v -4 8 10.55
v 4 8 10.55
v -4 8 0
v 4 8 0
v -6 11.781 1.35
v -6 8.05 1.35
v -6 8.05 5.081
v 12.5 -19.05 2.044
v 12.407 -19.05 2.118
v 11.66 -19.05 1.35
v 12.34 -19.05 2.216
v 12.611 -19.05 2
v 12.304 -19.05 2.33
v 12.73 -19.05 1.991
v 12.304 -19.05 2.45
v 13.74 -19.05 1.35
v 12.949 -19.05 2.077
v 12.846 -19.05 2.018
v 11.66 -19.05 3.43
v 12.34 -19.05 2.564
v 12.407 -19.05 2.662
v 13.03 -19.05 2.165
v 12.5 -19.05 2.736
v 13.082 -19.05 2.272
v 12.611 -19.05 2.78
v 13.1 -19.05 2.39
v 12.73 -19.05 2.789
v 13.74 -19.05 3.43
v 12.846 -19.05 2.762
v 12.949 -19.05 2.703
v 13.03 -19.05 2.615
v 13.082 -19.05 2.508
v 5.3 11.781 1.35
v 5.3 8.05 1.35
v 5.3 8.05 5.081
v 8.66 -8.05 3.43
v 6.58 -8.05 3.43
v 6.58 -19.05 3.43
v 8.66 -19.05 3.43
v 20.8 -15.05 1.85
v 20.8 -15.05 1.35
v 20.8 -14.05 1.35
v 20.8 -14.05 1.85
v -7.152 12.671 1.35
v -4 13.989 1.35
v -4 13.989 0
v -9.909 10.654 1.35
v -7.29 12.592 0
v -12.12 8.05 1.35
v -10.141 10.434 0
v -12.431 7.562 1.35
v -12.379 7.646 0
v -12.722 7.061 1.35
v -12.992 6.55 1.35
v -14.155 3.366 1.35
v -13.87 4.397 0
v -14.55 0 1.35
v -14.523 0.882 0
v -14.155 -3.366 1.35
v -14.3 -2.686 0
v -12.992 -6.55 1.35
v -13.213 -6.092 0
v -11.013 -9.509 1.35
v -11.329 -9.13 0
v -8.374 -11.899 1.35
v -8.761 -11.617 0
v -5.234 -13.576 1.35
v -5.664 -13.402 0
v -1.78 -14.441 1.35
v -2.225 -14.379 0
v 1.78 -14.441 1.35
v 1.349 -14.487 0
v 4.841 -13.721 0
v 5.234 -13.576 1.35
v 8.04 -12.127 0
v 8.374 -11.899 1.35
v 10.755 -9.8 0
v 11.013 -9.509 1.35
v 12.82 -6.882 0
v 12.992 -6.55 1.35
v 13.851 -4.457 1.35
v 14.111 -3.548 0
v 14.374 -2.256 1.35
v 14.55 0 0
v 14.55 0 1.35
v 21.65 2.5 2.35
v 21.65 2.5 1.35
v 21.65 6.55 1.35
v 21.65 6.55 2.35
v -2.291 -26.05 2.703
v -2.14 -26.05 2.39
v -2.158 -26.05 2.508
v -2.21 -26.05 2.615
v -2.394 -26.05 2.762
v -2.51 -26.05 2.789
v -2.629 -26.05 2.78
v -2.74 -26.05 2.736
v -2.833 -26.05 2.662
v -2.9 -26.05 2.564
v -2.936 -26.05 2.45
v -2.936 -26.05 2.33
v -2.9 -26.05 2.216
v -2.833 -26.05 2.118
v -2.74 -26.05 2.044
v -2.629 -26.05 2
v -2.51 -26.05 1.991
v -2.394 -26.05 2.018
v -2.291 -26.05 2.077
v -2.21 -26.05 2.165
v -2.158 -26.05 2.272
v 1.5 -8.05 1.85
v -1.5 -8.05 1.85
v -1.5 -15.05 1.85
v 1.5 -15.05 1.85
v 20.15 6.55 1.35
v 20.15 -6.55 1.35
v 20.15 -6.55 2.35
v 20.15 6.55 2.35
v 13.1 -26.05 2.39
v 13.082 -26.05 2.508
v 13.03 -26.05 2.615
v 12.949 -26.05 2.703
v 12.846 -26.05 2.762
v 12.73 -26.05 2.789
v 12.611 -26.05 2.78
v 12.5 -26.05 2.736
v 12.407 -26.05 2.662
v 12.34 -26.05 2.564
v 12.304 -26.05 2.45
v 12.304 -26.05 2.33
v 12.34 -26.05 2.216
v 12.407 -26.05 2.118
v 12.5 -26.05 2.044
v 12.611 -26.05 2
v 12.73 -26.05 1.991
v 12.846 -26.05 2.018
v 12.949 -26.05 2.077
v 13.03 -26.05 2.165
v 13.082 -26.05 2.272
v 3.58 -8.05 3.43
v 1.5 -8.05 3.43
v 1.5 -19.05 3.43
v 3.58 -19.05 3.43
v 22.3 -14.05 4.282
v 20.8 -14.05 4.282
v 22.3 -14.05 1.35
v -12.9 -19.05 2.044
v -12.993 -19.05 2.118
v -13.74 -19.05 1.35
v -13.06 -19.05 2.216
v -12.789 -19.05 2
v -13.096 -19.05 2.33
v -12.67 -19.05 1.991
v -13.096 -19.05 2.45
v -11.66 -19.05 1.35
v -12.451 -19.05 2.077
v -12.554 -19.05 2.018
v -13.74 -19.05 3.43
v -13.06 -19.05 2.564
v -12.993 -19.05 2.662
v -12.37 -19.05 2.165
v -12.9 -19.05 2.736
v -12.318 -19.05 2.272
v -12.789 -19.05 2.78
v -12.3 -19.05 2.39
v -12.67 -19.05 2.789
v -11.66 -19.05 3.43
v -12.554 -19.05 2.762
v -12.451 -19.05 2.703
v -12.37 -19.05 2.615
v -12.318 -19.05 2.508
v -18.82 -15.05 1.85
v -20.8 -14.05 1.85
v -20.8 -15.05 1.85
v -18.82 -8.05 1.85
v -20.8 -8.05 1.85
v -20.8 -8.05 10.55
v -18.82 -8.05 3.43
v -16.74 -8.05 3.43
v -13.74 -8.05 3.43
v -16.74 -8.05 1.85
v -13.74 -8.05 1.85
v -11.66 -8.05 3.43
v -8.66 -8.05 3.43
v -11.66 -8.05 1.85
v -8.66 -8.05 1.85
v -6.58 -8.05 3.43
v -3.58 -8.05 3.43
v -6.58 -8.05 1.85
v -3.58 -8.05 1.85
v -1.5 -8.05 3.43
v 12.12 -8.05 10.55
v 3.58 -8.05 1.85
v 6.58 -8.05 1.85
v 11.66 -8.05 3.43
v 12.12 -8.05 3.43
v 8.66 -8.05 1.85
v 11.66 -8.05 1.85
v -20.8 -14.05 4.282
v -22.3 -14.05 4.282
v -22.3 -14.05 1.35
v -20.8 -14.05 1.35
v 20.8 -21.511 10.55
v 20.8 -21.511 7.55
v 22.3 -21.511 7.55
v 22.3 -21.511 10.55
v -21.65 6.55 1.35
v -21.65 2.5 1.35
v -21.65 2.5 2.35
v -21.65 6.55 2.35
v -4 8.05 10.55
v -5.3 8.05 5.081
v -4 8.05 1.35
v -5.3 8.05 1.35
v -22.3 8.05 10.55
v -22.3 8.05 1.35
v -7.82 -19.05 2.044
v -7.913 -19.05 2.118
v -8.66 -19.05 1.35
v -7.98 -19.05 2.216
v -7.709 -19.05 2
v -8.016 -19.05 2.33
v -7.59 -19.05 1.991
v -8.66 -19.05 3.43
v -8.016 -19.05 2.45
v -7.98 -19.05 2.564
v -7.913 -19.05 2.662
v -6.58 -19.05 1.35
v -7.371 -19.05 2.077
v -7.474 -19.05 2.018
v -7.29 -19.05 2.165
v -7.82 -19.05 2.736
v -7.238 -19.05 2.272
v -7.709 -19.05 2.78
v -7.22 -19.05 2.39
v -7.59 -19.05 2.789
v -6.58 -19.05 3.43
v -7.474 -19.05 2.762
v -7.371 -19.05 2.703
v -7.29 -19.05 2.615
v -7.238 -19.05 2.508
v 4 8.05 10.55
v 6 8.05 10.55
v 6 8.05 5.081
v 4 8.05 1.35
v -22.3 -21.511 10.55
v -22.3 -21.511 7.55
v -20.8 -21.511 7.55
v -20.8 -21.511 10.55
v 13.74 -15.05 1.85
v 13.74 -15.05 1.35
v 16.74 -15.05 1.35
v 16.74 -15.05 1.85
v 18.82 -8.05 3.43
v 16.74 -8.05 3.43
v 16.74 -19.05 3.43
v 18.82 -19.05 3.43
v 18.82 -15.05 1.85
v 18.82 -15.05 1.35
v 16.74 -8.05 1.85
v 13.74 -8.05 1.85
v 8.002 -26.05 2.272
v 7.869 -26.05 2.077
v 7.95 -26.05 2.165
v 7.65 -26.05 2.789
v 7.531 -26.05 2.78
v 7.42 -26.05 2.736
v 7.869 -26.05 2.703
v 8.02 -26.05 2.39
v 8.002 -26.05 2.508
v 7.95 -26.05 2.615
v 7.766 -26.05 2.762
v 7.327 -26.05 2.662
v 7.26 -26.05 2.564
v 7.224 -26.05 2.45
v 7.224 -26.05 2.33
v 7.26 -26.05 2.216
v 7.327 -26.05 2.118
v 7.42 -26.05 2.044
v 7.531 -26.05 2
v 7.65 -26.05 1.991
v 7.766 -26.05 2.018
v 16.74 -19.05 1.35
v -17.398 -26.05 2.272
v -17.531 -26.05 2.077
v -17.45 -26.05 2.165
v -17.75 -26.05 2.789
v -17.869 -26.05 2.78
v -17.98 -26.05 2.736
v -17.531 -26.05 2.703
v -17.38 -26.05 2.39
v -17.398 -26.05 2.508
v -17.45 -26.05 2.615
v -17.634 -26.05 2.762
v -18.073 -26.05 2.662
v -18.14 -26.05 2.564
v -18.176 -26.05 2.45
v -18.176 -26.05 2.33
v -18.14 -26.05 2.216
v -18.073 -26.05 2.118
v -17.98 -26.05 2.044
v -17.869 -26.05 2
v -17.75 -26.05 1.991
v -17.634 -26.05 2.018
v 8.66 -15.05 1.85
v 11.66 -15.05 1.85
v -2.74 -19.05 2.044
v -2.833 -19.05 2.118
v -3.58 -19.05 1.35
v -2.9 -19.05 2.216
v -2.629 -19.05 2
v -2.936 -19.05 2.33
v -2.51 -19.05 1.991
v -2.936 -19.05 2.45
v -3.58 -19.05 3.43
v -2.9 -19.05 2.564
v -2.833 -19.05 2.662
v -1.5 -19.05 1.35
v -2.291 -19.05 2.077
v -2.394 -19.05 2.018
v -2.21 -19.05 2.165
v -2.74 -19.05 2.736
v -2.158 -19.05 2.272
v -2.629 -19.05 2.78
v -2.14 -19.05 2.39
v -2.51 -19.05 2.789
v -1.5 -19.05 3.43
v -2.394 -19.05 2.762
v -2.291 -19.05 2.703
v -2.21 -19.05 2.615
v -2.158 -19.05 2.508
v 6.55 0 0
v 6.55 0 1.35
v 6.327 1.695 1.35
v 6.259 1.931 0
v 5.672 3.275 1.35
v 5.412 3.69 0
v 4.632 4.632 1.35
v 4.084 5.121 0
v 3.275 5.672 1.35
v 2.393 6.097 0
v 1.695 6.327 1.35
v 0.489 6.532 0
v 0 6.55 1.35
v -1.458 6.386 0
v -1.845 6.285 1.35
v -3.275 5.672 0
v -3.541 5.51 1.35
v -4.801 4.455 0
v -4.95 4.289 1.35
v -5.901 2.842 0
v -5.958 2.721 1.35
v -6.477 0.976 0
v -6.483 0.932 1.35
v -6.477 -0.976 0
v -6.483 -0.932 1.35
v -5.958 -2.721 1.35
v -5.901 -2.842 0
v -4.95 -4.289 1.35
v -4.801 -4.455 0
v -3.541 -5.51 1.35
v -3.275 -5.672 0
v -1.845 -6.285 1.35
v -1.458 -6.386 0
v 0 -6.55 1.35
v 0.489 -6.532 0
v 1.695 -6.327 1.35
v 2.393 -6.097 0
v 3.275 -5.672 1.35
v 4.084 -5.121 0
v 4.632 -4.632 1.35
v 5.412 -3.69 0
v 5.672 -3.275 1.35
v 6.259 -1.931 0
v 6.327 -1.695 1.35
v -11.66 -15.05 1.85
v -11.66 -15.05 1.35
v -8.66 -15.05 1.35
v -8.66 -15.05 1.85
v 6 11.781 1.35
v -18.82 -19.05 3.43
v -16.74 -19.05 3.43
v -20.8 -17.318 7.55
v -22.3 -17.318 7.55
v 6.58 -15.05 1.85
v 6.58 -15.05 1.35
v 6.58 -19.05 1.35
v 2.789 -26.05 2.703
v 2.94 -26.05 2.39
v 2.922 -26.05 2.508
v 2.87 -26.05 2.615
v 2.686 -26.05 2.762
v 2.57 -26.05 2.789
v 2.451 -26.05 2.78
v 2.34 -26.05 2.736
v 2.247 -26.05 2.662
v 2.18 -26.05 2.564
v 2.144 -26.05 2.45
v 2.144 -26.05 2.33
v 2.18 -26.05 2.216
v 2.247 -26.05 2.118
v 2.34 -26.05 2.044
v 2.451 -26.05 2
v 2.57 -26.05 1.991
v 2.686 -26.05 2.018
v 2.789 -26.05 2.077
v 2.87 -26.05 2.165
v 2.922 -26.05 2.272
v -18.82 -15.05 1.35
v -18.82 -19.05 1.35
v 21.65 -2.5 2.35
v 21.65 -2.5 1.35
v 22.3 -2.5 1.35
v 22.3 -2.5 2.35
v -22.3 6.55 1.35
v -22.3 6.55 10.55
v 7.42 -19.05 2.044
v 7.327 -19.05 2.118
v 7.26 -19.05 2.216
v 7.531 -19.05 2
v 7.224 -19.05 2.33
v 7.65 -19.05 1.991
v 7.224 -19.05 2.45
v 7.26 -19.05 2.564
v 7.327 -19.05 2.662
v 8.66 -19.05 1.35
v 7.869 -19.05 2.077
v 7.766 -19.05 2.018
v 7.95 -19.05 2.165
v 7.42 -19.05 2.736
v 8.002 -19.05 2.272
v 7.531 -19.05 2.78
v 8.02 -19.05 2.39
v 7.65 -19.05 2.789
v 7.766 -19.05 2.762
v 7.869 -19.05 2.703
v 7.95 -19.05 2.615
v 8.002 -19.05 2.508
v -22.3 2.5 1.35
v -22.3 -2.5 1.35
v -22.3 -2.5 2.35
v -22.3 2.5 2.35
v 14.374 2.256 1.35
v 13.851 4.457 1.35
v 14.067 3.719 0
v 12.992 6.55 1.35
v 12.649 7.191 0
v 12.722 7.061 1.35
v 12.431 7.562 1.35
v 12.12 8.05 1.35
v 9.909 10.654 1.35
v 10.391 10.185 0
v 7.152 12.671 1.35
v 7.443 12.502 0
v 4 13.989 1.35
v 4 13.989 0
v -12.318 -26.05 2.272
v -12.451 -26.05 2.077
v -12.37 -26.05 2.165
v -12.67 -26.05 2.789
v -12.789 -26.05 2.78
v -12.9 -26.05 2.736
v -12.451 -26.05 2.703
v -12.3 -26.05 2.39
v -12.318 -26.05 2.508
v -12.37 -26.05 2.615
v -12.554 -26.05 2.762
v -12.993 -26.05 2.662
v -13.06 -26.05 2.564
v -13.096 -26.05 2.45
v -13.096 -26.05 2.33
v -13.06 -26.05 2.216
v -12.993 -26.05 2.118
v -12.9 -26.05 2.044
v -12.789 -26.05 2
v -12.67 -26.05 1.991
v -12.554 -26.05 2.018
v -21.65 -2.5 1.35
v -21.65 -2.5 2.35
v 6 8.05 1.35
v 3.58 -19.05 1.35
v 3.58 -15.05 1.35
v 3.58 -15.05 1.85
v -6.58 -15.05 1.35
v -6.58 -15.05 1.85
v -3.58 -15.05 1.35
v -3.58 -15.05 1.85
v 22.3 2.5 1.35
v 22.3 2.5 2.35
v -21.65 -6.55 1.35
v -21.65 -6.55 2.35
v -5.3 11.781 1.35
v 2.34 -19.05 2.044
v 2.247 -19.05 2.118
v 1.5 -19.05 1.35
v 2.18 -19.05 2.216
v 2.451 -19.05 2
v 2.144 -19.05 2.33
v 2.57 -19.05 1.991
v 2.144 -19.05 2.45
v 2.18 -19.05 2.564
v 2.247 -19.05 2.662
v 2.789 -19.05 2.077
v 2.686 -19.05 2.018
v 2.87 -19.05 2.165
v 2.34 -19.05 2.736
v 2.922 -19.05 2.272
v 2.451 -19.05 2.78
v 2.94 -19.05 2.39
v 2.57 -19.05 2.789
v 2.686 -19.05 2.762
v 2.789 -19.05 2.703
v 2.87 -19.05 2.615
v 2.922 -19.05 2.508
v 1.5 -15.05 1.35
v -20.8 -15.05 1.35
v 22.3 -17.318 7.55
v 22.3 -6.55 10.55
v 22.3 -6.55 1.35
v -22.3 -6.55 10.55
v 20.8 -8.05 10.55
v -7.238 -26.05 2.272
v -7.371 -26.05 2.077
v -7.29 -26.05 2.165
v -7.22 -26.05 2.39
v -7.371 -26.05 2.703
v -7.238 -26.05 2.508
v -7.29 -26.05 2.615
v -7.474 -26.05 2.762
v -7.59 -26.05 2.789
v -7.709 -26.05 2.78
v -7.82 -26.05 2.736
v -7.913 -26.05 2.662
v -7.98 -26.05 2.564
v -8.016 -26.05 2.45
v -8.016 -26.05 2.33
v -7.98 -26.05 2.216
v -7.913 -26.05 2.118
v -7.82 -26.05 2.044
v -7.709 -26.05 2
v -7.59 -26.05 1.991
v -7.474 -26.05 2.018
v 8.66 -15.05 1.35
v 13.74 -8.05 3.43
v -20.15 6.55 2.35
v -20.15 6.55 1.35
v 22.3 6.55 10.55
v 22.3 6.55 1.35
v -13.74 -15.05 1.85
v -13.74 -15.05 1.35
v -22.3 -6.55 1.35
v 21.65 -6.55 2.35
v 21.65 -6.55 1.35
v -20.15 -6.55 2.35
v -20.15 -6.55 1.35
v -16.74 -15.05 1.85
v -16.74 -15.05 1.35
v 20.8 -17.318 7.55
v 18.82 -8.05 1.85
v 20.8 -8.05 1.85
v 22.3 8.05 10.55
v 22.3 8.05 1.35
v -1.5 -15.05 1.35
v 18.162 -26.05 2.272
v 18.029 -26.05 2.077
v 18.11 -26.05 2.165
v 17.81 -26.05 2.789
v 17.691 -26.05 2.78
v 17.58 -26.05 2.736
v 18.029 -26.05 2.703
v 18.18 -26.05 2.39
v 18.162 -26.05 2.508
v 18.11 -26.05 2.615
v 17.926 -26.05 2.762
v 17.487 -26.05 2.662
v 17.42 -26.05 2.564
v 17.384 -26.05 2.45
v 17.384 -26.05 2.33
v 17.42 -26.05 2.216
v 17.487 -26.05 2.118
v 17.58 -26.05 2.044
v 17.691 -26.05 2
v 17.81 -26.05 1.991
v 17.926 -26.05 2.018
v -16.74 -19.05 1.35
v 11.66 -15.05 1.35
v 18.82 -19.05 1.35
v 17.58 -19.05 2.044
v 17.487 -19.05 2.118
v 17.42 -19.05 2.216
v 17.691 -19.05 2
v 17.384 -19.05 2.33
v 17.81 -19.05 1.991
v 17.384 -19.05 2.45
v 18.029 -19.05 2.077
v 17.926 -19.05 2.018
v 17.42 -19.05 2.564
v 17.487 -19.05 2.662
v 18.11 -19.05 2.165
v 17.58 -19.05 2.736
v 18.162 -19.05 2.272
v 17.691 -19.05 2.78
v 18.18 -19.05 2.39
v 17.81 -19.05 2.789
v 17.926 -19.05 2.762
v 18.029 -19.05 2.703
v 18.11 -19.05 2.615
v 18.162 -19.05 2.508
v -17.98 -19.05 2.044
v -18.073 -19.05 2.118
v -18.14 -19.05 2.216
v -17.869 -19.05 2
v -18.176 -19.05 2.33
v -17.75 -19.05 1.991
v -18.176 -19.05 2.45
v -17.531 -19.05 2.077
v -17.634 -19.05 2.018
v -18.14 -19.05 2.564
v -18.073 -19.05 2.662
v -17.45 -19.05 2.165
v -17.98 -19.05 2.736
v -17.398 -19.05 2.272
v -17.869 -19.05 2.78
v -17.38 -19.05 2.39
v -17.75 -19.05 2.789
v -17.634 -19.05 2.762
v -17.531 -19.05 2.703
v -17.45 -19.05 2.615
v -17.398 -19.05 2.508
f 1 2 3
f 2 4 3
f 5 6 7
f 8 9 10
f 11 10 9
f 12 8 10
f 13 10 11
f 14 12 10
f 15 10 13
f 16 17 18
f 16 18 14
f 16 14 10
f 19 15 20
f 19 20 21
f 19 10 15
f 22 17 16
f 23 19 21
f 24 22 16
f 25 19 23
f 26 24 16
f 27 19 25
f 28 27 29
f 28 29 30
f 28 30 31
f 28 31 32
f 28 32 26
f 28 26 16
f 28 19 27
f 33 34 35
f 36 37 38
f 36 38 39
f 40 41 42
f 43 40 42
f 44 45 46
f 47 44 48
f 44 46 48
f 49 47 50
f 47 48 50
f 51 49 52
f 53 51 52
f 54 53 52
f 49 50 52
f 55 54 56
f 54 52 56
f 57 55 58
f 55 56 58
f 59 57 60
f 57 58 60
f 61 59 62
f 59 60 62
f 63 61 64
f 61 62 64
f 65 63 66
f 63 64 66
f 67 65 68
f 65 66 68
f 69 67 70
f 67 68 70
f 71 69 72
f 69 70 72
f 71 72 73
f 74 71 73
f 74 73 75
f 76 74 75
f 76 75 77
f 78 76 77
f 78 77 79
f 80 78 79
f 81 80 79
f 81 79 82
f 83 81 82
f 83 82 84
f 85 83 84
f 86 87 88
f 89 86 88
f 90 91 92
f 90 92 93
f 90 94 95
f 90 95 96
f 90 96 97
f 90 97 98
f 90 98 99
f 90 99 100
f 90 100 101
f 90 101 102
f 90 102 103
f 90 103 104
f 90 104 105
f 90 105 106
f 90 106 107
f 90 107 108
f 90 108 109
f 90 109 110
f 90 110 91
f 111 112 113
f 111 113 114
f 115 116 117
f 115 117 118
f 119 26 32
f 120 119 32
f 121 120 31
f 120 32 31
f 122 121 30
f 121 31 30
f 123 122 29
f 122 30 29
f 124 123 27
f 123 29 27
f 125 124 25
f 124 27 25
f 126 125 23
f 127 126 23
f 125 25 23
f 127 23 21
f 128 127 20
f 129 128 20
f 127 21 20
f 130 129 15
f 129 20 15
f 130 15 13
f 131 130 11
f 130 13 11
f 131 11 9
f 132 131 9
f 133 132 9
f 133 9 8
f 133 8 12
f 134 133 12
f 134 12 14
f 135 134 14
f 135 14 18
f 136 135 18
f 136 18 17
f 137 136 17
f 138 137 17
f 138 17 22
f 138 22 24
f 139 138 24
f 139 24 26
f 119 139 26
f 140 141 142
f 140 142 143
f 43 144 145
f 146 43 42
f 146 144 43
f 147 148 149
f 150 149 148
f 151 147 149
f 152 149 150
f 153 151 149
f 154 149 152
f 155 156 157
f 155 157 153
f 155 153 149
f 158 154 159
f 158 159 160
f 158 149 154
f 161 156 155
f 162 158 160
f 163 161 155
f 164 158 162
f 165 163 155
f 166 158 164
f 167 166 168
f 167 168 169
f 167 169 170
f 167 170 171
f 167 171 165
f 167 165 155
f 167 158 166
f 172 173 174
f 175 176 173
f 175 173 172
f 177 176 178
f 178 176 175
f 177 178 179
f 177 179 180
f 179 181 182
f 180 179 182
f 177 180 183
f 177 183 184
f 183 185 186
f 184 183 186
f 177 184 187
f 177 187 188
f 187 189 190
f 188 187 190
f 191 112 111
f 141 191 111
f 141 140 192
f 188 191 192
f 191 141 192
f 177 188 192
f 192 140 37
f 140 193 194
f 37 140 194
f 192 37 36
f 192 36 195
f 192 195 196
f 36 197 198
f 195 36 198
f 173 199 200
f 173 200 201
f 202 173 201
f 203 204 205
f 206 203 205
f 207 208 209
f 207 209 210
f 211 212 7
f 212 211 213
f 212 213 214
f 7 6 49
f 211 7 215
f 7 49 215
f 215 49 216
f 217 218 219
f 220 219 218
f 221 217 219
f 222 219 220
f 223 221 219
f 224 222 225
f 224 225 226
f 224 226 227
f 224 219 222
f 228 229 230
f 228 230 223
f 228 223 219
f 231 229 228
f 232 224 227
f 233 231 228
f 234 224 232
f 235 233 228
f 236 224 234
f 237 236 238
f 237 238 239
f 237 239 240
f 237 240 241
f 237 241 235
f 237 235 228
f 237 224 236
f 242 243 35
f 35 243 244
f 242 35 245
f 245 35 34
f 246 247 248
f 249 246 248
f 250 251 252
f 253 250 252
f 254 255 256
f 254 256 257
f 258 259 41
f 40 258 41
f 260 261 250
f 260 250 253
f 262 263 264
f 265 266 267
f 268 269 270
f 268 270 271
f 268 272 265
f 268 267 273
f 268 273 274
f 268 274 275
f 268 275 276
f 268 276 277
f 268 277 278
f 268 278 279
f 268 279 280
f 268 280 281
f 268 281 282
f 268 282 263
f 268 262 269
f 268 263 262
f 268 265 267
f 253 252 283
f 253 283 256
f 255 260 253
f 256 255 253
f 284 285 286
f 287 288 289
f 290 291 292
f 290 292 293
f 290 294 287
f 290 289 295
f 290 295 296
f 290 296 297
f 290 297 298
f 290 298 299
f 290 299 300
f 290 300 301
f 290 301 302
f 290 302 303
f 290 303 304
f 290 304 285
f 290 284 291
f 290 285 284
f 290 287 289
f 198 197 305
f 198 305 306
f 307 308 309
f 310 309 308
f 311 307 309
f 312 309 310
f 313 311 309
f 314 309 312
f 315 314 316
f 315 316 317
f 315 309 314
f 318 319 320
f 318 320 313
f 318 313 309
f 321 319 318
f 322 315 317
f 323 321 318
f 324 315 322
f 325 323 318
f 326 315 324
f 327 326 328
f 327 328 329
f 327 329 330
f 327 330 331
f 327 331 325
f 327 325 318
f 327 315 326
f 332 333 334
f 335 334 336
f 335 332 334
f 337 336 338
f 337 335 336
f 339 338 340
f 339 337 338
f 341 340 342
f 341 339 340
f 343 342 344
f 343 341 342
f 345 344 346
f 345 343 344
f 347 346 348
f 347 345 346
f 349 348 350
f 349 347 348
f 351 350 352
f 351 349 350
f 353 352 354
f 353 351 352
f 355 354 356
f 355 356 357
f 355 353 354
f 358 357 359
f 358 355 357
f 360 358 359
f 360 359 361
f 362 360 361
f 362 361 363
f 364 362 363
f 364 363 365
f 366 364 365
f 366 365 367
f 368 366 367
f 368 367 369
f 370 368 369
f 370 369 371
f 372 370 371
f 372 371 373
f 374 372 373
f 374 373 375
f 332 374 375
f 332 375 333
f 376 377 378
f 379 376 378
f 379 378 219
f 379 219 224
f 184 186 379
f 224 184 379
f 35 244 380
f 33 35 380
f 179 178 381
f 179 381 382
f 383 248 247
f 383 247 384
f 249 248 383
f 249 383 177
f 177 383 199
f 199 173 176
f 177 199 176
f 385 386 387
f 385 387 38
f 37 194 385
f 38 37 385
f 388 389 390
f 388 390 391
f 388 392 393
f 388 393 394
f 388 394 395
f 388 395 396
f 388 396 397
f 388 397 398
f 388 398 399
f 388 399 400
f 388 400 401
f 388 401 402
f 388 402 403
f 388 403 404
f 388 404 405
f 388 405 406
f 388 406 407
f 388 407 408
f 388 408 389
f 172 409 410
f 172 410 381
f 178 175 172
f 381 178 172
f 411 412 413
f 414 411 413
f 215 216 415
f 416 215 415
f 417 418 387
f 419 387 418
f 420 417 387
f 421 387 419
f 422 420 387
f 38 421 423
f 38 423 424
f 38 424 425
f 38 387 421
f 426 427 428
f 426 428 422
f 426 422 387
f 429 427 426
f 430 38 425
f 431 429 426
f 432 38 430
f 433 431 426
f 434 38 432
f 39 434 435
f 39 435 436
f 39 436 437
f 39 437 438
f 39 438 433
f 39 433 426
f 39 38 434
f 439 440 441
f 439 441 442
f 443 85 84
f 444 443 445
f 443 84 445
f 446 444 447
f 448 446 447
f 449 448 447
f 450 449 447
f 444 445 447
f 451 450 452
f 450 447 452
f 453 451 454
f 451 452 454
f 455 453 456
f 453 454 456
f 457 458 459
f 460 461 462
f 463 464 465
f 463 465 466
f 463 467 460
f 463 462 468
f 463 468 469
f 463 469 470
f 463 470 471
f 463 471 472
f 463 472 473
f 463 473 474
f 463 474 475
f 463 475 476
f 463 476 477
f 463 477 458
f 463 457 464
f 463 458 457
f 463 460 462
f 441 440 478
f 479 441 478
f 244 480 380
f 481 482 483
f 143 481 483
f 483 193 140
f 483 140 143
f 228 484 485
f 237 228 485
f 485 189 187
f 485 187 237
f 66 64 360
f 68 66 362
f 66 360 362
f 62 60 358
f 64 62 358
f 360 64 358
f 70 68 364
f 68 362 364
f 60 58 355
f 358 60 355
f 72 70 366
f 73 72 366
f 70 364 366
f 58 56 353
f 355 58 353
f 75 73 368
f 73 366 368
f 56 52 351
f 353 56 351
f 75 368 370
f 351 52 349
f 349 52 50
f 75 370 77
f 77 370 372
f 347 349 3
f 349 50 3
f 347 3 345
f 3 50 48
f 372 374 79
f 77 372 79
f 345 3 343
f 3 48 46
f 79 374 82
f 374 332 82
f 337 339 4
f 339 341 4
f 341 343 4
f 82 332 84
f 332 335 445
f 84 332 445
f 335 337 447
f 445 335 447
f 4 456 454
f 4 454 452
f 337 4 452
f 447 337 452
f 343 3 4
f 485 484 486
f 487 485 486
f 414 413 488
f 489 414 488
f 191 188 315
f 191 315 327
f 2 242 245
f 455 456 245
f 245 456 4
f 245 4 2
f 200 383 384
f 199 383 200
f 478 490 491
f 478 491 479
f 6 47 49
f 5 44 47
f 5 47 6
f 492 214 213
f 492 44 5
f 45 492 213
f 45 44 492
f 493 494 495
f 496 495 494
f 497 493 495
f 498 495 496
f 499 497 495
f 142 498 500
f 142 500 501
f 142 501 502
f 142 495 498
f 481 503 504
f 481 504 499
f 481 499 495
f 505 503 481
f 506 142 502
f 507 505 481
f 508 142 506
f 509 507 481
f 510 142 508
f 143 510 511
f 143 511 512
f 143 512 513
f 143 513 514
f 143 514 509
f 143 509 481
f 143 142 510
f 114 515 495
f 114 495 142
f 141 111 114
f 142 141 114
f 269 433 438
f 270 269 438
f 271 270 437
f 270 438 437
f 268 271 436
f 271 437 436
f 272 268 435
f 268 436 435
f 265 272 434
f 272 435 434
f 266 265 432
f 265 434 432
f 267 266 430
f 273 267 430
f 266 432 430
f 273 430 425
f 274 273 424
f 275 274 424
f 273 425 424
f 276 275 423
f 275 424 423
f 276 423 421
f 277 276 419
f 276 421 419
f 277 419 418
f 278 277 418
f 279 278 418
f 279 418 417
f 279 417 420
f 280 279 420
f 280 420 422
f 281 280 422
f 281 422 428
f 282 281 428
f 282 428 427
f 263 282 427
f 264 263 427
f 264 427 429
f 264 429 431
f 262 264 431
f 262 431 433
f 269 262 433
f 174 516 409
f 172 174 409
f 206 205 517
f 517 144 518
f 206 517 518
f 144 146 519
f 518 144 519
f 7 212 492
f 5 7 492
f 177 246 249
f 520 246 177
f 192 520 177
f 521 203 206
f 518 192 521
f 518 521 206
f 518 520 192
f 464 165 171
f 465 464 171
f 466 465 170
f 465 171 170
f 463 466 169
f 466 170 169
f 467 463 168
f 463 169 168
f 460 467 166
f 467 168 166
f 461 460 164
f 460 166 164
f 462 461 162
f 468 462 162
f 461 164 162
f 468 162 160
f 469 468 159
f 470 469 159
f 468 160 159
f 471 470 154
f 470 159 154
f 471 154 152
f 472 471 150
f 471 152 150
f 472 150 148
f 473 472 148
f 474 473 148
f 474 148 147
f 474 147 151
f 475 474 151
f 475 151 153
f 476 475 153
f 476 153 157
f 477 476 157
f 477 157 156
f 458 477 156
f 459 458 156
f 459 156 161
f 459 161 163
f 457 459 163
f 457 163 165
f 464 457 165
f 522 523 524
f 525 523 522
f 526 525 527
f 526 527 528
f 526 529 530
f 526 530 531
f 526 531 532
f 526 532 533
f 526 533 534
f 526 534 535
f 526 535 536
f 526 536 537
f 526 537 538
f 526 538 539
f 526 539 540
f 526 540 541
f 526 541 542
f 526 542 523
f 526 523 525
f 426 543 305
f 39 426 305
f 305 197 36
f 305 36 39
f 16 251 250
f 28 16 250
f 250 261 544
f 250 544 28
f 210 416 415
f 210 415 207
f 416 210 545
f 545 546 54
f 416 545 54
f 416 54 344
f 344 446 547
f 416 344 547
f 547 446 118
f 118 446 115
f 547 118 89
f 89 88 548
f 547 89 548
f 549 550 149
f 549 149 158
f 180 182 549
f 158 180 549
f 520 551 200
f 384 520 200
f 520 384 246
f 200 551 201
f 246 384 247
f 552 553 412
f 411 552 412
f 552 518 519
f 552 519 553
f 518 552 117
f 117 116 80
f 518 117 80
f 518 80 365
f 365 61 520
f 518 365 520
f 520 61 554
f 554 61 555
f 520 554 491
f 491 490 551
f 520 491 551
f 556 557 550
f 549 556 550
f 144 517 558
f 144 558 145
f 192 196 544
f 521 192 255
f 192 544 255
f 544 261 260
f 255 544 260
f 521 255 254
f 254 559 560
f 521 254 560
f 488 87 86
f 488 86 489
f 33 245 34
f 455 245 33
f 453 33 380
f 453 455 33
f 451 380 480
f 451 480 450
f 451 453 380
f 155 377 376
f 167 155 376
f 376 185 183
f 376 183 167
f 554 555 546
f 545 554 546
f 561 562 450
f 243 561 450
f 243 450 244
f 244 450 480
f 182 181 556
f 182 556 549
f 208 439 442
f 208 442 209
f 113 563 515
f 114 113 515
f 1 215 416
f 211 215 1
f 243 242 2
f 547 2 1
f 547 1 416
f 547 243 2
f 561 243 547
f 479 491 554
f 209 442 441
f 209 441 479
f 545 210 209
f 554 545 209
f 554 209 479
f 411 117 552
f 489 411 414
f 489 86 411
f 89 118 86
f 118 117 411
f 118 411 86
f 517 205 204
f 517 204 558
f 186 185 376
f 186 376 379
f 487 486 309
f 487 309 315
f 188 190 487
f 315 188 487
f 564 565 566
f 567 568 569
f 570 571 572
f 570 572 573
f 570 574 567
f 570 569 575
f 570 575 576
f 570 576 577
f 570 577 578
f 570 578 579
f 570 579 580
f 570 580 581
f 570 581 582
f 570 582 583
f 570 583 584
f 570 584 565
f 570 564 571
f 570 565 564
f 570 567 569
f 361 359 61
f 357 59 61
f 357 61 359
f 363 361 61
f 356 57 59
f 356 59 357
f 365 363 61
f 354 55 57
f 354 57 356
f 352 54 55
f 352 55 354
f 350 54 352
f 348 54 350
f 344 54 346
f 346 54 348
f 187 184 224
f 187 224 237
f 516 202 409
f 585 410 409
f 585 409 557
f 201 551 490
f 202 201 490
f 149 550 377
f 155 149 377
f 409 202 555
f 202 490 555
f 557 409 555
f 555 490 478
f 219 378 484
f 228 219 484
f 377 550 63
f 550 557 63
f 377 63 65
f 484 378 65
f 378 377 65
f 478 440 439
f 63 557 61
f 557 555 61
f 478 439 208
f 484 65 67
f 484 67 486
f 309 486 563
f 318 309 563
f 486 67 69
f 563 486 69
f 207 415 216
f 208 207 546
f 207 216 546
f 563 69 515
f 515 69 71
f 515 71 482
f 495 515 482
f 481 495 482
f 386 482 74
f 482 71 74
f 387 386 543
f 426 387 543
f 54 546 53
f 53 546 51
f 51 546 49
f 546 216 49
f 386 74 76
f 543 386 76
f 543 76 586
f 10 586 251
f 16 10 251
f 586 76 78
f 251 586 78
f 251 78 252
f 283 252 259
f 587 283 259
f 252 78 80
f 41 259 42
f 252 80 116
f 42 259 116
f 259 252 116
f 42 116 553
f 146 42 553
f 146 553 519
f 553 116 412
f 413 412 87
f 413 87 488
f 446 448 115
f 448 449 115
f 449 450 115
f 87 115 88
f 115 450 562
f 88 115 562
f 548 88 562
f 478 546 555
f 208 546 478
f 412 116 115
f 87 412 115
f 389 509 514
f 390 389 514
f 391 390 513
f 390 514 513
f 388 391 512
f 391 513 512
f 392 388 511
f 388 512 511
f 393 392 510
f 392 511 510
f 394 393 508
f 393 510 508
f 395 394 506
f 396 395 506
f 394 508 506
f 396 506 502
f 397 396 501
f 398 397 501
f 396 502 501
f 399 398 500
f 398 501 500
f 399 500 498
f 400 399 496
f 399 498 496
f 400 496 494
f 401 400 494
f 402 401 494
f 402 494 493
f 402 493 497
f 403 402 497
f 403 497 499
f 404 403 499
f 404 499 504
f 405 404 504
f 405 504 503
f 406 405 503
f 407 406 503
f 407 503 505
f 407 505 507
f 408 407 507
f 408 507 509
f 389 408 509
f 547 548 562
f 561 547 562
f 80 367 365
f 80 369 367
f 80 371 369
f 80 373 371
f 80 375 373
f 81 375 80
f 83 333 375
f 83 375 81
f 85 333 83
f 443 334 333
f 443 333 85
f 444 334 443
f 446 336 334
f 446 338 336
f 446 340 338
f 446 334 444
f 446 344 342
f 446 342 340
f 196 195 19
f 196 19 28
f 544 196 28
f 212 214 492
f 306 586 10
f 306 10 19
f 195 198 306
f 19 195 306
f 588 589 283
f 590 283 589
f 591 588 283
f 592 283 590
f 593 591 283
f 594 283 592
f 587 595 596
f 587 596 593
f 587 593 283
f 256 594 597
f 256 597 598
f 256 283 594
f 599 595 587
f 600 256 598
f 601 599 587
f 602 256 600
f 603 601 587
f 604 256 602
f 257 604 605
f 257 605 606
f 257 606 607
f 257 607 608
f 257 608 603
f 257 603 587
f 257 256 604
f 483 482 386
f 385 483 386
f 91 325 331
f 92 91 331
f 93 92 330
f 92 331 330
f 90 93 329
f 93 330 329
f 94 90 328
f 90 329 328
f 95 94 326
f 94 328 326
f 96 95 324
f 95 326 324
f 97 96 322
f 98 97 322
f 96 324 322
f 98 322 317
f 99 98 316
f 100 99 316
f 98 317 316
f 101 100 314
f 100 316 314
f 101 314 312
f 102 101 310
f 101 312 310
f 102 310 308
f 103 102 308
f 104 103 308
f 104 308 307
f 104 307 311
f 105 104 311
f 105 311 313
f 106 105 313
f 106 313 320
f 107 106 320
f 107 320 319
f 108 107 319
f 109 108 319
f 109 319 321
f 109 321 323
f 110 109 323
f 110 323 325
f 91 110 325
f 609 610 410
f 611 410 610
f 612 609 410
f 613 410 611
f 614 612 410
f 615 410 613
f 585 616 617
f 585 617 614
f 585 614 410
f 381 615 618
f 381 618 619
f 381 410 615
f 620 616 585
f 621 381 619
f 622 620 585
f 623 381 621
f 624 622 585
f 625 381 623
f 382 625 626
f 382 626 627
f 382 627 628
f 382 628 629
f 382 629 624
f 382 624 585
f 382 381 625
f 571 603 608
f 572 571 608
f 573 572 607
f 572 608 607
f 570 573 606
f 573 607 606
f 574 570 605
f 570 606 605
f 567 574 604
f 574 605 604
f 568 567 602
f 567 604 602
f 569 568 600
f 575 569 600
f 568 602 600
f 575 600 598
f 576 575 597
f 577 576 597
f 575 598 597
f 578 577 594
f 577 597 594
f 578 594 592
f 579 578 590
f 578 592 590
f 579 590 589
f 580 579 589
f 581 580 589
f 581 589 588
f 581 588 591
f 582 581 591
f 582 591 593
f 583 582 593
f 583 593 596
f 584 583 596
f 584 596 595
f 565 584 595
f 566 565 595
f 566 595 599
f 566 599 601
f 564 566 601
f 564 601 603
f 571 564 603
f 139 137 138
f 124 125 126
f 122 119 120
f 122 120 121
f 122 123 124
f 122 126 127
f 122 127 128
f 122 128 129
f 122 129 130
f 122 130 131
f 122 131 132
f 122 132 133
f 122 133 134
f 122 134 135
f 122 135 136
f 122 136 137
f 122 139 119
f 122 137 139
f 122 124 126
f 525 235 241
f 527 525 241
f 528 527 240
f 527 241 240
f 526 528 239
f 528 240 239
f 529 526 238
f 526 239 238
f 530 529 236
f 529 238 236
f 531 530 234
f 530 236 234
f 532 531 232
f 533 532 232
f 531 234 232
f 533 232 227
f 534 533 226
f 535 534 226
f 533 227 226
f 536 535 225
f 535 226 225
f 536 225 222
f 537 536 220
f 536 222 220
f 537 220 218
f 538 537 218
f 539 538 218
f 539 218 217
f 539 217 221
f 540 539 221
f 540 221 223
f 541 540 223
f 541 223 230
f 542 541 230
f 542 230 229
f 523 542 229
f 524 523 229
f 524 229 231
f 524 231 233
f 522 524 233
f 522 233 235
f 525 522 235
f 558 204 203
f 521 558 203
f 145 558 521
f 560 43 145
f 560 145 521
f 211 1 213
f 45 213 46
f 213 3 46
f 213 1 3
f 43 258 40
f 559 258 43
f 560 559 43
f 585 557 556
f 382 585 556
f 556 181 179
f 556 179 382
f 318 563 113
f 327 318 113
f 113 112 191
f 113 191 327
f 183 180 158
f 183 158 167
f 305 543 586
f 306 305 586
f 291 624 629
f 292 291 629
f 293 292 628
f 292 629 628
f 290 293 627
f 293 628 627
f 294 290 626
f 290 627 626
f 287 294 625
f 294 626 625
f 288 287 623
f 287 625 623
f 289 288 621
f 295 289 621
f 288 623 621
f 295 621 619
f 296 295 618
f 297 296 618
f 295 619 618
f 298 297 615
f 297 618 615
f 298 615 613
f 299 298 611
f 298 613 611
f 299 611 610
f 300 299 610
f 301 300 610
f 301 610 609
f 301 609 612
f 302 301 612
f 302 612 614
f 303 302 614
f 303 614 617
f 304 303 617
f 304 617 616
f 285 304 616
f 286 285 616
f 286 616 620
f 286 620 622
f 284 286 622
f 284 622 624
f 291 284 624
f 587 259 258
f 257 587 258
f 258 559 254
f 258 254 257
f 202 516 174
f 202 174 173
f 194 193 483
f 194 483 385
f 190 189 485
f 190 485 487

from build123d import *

# Parameters (mm, degrees)
SKETCH1_R           = 6.55
BOSS_EXTRUDE1_DEPTH = 1.35
SKETCH2_W           = 0.7
SKETCH2_H           = 3.730882663
SKETCH2_W_2         = 1.5
SKETCH2_H_2         = 13.460629035
BOSS_EXTRUDE2_DEPTH = 9.2
SKETCH3_W           = 1.5
SKETCH3_H           = 13.1
SKETCH3_W_2         = 0.65
SKETCH3_H_2         = 5
BOSS_EXTRUDE3_DEPTH = 1
CUT_EXTRUDE1_DEPTH  = 29.3
CUT_EXTRUDE2_DEPTH  = 45.6
SKETCH7_W           = 41.6
SKETCH7_H           = 7
BOSS_EXTRUDE4_DEPTH = 0.5
SKETCH8_R           = 0.4
PINS_DEPTH          = 11
PINS_2_DEPTH        = 11
PINS_3_DEPTH        = 11
PINS_4_DEPTH        = 11
PINS_5_DEPTH        = 11
PINS_6_DEPTH        = 11
PINS_7_DEPTH        = 11
PINS_8_DEPTH        = 11
SKETCH9_W           = 2.08
SKETCH9_H           = 2.08
BOSS_EXTRUDE6_DEPTH = 11


with BuildPart() as part:
    # Sketch1 → Boss-Extrude1 (new body)
    with BuildSketch(Plane.XY):
        with BuildLine():
            Line((0, 8), (-4, 8))
            Line((-4, 8), (-4, 13.989370965))
            ThreePointArc((-4, 13.989370965), (-8.760779075, -11.616851983), (14.55, 0))
            ThreePointArc((14.55, 0), (11.616851983, 8.760779075), (4, 13.989370965))
            Line((4, 13.989370965), (4, 8))
            Line((4, 8), (0, 8))
        make_face()
        Circle(SKETCH1_R, mode=Mode.SUBTRACT)
    extrude(amount=BOSS_EXTRUDE1_DEPTH)

    # Sketch2 → Boss-Extrude2 (add)
    with BuildSketch(Plane.XY.offset(1.35)):
        with BuildLine():
            ThreePointArc((12.120231021, 8.05), (12.578647446, 7.313010901), (12.992305415, 6.55))
            Line((12.992305415, 6.55), (22.3, 6.55))
            Line((22.3, 6.55), (22.3, 8.05))
            Line((22.3, 8.05), (12.120231021, 8.05))
        make_face()
        with Locations((5.65, 9.915441332)):
            Rectangle(SKETCH2_W, SKETCH2_H)
        with BuildLine():
            Line((-5.3, 8.05), (-6, 8.05))
            Line((-6, 8.05), (-12.120231021, 8.05))
            ThreePointArc((-12.120231021, 8.05), (-12.578647446, 7.313010901), (-12.992305415, 6.55))
            Line((-12.992305415, 6.55), (12.992305415, 6.55))
            ThreePointArc((12.992305415, 6.55), (12.578647446, 7.313010901), (12.120231021, 8.05))
            Line((12.120231021, 8.05), (6, 8.05))
            Line((6, 8.05), (5.3, 8.05))
            Line((5.3, 8.05), (4, 8.05))
            Line((4, 8.05), (4, 8))
            Line((4, 8), (-4, 8))
            Line((-4, 8), (-4, 8.05))
            Line((-4, 8.05), (-5.3, 8.05))
        make_face()
        with BuildLine():
            ThreePointArc((-12.992305415, 6.55), (-12.578647446, 7.313010901), (-12.120231021, 8.05))
            Line((-12.120231021, 8.05), (-22.3, 8.05))
            Line((-22.3, 8.05), (-22.3, 6.55))
            Line((-22.3, 6.55), (-12.992305415, 6.55))
        make_face()
        with Locations((-21.55, -14.780314518)):
            Rectangle(SKETCH2_W_2, SKETCH2_H_2)
        with BuildLine():
            ThreePointArc((-12.120231021, -8.05), (-12.578647446, -7.313010901), (-12.992305415, -6.55))
            Line((-12.992305415, -6.55), (-22.3, -6.55))
            Line((-22.3, -6.55), (-22.3, -8.05))
            Line((-22.3, -8.05), (-20.8, -8.05))
            Line((-20.8, -8.05), (-12.120231021, -8.05))
        make_face()
        with BuildLine():
            Line((12.992305415, -6.55), (-12.992305415, -6.55))
            ThreePointArc((-12.992305415, -6.55), (-12.578647446, -7.313010901), (-12.120231021, -8.05))
            Line((-12.120231021, -8.05), (12.120231021, -8.05))
            ThreePointArc((12.120231021, -8.05), (12.578647446, -7.313010901), (12.992305415, -6.55))
        make_face()
        with BuildLine():
            Line((22.3, -6.55), (12.992305415, -6.55))
            ThreePointArc((12.992305415, -6.55), (12.578647446, -7.313010901), (12.120231021, -8.05))
            Line((12.120231021, -8.05), (20.8, -8.05))
            Line((20.8, -8.05), (22.3, -8.05))
            Line((22.3, -8.05), (22.3, -6.55))
        make_face()
        with Locations((21.55, -14.780314518)):
            Rectangle(SKETCH2_W_2, SKETCH2_H_2)
        with Locations((-5.65, 9.915441332)):
            Rectangle(SKETCH2_W, SKETCH2_H)
    extrude(amount=BOSS_EXTRUDE2_DEPTH)

    # Sketch3 → Boss-Extrude3 (add)
    with BuildSketch(Plane.XY.offset(1.35)):
        with Locations((-20.9, 0)):
            Rectangle(SKETCH3_W, SKETCH3_H)
        with Locations((-21.975, 0)):
            Rectangle(SKETCH3_W_2, SKETCH3_H_2)
        with Locations((21.975, 0)):
            Rectangle(SKETCH3_W_2, SKETCH3_H_2)
        with Locations((20.9, 0)):
            Rectangle(SKETCH3_W, SKETCH3_H)
    extrude(amount=BOSS_EXTRUDE3_DEPTH)

    # Sketch5 → Cut-Extrude1 (cut, through all)
    with BuildSketch(Plane(origin=(6, 0, 0), x_dir=(0, 0, -1), z_dir=(1, 0, 0))):
        Polygon((-10.55, 8.05), (-5.080882663, 8.05), (-1.35, 11.780882663), (-10.55, 11.780882663), align=None)
    extrude(amount=-CUT_EXTRUDE1_DEPTH, mode=Mode.SUBTRACT)

    # Sketch6 → Cut-Extrude2 (cut, through all)
    with BuildSketch(Plane(origin=(22.3, 0, 0), x_dir=(0, 0, -1), z_dir=(1, 0, 0))):
        Polygon((-7.55, -21.510629035), (-7.55, -17.317508604), (-4.282491396, -14.05), (-1.35, -14.05), (-1.35, -21.510629035), align=None)
    extrude(amount=-CUT_EXTRUDE2_DEPTH, mode=Mode.SUBTRACT)

    # Sketch7 → Boss-Extrude4 (add)
    with BuildSketch(Plane.XY.offset(1.35)):
        with Locations((0, -11.55)):
            Rectangle(SKETCH7_W, SKETCH7_H)
    extrude(amount=BOSS_EXTRUDE4_DEPTH)



with BuildPart() as body_2:
    # Sketch8 → Pins (new body)
    with BuildSketch(Plane.XZ.offset(15.05)):
        with Locations((-17.78, 2.39)):
            Circle(SKETCH8_R)
    extrude(amount=PINS_DEPTH)


with BuildPart() as body_3:
    # Sketch8 → Pins 2 (new body)
    with BuildSketch(Plane.XZ.offset(15.05)):
        with Locations((-12.7, 2.39)):
            Circle(SKETCH8_R)
    extrude(amount=PINS_2_DEPTH)


with BuildPart() as body_4:
    # Sketch8 → Pins 3 (new body)
    with BuildSketch(Plane.XZ.offset(15.05)):
        with Locations((-7.62, 2.39)):
            Circle(SKETCH8_R)
    extrude(amount=PINS_3_DEPTH)


with BuildPart() as body_5:
    # Sketch8 → Pins 4 (new body)
    with BuildSketch(Plane.XZ.offset(15.05)):
        with Locations((-2.54, 2.39)):
            Circle(SKETCH8_R)
    extrude(amount=PINS_4_DEPTH)


with BuildPart() as body_6:
    # Sketch8 → Pins 5 (new body)
    with BuildSketch(Plane.XZ.offset(15.05)):
        with Locations((2.54, 2.39)):
            Circle(SKETCH8_R)
    extrude(amount=PINS_5_DEPTH)


with BuildPart() as body_7:
    # Sketch8 → Pins 6 (new body)
    with BuildSketch(Plane.XZ.offset(15.05)):
        with Locations((7.62, 2.39)):
            Circle(SKETCH8_R)
    extrude(amount=PINS_6_DEPTH)


with BuildPart() as body_8:
    # Sketch8 → Pins 7 (new body)
    with BuildSketch(Plane.XZ.offset(15.05)):
        with Locations((12.7, 2.39)):
            Circle(SKETCH8_R)
    extrude(amount=PINS_7_DEPTH)


with BuildPart() as body_9:
    # Sketch8 → Pins 8 (new body)
    with BuildSketch(Plane.XZ.offset(15.05)):
        with Locations((17.78, 2.39)):
            Circle(SKETCH8_R)
    extrude(amount=PINS_8_DEPTH)


with BuildPart() as part_1:
    add(part.part)

    add(body_2.part)  # Boss-Extrude6 merges body 2

    add(body_3.part)  # Boss-Extrude6 merges body 3

    add(body_4.part)  # Boss-Extrude6 merges body 4

    add(body_5.part)  # Boss-Extrude6 merges body 5

    add(body_6.part)  # Boss-Extrude6 merges body 6

    add(body_7.part)  # Boss-Extrude6 merges body 7

    add(body_8.part)  # Boss-Extrude6 merges body 8

    add(body_9.part)  # Boss-Extrude6 merges body 9
    # Sketch9 → Boss-Extrude6 (add)
    with BuildSketch(Plane.XZ.offset(8.05)):
        with Locations((-12.7, 2.39)):
            Rectangle(SKETCH9_W, SKETCH9_H)
        with Locations((-17.78, 2.39)):
            Rectangle(SKETCH9_W, SKETCH9_H)
        with Locations((-7.62, 2.39)):
            Rectangle(SKETCH9_W, SKETCH9_H)
        with Locations((-2.54, 2.39)):
            Rectangle(SKETCH9_W, SKETCH9_H)
        with Locations((2.54, 2.39)):
            Rectangle(SKETCH9_W, SKETCH9_H)
        with Locations((7.62, 2.39)):
            Rectangle(SKETCH9_W, SKETCH9_H)
        with Locations((12.7, 2.39)):
            Rectangle(SKETCH9_W, SKETCH9_H)
        with Locations((17.78, 2.39)):
            Rectangle(SKETCH9_W, SKETCH9_H)
    extrude(amount=BOSS_EXTRUDE6_DEPTH)


solid = part_1.part
